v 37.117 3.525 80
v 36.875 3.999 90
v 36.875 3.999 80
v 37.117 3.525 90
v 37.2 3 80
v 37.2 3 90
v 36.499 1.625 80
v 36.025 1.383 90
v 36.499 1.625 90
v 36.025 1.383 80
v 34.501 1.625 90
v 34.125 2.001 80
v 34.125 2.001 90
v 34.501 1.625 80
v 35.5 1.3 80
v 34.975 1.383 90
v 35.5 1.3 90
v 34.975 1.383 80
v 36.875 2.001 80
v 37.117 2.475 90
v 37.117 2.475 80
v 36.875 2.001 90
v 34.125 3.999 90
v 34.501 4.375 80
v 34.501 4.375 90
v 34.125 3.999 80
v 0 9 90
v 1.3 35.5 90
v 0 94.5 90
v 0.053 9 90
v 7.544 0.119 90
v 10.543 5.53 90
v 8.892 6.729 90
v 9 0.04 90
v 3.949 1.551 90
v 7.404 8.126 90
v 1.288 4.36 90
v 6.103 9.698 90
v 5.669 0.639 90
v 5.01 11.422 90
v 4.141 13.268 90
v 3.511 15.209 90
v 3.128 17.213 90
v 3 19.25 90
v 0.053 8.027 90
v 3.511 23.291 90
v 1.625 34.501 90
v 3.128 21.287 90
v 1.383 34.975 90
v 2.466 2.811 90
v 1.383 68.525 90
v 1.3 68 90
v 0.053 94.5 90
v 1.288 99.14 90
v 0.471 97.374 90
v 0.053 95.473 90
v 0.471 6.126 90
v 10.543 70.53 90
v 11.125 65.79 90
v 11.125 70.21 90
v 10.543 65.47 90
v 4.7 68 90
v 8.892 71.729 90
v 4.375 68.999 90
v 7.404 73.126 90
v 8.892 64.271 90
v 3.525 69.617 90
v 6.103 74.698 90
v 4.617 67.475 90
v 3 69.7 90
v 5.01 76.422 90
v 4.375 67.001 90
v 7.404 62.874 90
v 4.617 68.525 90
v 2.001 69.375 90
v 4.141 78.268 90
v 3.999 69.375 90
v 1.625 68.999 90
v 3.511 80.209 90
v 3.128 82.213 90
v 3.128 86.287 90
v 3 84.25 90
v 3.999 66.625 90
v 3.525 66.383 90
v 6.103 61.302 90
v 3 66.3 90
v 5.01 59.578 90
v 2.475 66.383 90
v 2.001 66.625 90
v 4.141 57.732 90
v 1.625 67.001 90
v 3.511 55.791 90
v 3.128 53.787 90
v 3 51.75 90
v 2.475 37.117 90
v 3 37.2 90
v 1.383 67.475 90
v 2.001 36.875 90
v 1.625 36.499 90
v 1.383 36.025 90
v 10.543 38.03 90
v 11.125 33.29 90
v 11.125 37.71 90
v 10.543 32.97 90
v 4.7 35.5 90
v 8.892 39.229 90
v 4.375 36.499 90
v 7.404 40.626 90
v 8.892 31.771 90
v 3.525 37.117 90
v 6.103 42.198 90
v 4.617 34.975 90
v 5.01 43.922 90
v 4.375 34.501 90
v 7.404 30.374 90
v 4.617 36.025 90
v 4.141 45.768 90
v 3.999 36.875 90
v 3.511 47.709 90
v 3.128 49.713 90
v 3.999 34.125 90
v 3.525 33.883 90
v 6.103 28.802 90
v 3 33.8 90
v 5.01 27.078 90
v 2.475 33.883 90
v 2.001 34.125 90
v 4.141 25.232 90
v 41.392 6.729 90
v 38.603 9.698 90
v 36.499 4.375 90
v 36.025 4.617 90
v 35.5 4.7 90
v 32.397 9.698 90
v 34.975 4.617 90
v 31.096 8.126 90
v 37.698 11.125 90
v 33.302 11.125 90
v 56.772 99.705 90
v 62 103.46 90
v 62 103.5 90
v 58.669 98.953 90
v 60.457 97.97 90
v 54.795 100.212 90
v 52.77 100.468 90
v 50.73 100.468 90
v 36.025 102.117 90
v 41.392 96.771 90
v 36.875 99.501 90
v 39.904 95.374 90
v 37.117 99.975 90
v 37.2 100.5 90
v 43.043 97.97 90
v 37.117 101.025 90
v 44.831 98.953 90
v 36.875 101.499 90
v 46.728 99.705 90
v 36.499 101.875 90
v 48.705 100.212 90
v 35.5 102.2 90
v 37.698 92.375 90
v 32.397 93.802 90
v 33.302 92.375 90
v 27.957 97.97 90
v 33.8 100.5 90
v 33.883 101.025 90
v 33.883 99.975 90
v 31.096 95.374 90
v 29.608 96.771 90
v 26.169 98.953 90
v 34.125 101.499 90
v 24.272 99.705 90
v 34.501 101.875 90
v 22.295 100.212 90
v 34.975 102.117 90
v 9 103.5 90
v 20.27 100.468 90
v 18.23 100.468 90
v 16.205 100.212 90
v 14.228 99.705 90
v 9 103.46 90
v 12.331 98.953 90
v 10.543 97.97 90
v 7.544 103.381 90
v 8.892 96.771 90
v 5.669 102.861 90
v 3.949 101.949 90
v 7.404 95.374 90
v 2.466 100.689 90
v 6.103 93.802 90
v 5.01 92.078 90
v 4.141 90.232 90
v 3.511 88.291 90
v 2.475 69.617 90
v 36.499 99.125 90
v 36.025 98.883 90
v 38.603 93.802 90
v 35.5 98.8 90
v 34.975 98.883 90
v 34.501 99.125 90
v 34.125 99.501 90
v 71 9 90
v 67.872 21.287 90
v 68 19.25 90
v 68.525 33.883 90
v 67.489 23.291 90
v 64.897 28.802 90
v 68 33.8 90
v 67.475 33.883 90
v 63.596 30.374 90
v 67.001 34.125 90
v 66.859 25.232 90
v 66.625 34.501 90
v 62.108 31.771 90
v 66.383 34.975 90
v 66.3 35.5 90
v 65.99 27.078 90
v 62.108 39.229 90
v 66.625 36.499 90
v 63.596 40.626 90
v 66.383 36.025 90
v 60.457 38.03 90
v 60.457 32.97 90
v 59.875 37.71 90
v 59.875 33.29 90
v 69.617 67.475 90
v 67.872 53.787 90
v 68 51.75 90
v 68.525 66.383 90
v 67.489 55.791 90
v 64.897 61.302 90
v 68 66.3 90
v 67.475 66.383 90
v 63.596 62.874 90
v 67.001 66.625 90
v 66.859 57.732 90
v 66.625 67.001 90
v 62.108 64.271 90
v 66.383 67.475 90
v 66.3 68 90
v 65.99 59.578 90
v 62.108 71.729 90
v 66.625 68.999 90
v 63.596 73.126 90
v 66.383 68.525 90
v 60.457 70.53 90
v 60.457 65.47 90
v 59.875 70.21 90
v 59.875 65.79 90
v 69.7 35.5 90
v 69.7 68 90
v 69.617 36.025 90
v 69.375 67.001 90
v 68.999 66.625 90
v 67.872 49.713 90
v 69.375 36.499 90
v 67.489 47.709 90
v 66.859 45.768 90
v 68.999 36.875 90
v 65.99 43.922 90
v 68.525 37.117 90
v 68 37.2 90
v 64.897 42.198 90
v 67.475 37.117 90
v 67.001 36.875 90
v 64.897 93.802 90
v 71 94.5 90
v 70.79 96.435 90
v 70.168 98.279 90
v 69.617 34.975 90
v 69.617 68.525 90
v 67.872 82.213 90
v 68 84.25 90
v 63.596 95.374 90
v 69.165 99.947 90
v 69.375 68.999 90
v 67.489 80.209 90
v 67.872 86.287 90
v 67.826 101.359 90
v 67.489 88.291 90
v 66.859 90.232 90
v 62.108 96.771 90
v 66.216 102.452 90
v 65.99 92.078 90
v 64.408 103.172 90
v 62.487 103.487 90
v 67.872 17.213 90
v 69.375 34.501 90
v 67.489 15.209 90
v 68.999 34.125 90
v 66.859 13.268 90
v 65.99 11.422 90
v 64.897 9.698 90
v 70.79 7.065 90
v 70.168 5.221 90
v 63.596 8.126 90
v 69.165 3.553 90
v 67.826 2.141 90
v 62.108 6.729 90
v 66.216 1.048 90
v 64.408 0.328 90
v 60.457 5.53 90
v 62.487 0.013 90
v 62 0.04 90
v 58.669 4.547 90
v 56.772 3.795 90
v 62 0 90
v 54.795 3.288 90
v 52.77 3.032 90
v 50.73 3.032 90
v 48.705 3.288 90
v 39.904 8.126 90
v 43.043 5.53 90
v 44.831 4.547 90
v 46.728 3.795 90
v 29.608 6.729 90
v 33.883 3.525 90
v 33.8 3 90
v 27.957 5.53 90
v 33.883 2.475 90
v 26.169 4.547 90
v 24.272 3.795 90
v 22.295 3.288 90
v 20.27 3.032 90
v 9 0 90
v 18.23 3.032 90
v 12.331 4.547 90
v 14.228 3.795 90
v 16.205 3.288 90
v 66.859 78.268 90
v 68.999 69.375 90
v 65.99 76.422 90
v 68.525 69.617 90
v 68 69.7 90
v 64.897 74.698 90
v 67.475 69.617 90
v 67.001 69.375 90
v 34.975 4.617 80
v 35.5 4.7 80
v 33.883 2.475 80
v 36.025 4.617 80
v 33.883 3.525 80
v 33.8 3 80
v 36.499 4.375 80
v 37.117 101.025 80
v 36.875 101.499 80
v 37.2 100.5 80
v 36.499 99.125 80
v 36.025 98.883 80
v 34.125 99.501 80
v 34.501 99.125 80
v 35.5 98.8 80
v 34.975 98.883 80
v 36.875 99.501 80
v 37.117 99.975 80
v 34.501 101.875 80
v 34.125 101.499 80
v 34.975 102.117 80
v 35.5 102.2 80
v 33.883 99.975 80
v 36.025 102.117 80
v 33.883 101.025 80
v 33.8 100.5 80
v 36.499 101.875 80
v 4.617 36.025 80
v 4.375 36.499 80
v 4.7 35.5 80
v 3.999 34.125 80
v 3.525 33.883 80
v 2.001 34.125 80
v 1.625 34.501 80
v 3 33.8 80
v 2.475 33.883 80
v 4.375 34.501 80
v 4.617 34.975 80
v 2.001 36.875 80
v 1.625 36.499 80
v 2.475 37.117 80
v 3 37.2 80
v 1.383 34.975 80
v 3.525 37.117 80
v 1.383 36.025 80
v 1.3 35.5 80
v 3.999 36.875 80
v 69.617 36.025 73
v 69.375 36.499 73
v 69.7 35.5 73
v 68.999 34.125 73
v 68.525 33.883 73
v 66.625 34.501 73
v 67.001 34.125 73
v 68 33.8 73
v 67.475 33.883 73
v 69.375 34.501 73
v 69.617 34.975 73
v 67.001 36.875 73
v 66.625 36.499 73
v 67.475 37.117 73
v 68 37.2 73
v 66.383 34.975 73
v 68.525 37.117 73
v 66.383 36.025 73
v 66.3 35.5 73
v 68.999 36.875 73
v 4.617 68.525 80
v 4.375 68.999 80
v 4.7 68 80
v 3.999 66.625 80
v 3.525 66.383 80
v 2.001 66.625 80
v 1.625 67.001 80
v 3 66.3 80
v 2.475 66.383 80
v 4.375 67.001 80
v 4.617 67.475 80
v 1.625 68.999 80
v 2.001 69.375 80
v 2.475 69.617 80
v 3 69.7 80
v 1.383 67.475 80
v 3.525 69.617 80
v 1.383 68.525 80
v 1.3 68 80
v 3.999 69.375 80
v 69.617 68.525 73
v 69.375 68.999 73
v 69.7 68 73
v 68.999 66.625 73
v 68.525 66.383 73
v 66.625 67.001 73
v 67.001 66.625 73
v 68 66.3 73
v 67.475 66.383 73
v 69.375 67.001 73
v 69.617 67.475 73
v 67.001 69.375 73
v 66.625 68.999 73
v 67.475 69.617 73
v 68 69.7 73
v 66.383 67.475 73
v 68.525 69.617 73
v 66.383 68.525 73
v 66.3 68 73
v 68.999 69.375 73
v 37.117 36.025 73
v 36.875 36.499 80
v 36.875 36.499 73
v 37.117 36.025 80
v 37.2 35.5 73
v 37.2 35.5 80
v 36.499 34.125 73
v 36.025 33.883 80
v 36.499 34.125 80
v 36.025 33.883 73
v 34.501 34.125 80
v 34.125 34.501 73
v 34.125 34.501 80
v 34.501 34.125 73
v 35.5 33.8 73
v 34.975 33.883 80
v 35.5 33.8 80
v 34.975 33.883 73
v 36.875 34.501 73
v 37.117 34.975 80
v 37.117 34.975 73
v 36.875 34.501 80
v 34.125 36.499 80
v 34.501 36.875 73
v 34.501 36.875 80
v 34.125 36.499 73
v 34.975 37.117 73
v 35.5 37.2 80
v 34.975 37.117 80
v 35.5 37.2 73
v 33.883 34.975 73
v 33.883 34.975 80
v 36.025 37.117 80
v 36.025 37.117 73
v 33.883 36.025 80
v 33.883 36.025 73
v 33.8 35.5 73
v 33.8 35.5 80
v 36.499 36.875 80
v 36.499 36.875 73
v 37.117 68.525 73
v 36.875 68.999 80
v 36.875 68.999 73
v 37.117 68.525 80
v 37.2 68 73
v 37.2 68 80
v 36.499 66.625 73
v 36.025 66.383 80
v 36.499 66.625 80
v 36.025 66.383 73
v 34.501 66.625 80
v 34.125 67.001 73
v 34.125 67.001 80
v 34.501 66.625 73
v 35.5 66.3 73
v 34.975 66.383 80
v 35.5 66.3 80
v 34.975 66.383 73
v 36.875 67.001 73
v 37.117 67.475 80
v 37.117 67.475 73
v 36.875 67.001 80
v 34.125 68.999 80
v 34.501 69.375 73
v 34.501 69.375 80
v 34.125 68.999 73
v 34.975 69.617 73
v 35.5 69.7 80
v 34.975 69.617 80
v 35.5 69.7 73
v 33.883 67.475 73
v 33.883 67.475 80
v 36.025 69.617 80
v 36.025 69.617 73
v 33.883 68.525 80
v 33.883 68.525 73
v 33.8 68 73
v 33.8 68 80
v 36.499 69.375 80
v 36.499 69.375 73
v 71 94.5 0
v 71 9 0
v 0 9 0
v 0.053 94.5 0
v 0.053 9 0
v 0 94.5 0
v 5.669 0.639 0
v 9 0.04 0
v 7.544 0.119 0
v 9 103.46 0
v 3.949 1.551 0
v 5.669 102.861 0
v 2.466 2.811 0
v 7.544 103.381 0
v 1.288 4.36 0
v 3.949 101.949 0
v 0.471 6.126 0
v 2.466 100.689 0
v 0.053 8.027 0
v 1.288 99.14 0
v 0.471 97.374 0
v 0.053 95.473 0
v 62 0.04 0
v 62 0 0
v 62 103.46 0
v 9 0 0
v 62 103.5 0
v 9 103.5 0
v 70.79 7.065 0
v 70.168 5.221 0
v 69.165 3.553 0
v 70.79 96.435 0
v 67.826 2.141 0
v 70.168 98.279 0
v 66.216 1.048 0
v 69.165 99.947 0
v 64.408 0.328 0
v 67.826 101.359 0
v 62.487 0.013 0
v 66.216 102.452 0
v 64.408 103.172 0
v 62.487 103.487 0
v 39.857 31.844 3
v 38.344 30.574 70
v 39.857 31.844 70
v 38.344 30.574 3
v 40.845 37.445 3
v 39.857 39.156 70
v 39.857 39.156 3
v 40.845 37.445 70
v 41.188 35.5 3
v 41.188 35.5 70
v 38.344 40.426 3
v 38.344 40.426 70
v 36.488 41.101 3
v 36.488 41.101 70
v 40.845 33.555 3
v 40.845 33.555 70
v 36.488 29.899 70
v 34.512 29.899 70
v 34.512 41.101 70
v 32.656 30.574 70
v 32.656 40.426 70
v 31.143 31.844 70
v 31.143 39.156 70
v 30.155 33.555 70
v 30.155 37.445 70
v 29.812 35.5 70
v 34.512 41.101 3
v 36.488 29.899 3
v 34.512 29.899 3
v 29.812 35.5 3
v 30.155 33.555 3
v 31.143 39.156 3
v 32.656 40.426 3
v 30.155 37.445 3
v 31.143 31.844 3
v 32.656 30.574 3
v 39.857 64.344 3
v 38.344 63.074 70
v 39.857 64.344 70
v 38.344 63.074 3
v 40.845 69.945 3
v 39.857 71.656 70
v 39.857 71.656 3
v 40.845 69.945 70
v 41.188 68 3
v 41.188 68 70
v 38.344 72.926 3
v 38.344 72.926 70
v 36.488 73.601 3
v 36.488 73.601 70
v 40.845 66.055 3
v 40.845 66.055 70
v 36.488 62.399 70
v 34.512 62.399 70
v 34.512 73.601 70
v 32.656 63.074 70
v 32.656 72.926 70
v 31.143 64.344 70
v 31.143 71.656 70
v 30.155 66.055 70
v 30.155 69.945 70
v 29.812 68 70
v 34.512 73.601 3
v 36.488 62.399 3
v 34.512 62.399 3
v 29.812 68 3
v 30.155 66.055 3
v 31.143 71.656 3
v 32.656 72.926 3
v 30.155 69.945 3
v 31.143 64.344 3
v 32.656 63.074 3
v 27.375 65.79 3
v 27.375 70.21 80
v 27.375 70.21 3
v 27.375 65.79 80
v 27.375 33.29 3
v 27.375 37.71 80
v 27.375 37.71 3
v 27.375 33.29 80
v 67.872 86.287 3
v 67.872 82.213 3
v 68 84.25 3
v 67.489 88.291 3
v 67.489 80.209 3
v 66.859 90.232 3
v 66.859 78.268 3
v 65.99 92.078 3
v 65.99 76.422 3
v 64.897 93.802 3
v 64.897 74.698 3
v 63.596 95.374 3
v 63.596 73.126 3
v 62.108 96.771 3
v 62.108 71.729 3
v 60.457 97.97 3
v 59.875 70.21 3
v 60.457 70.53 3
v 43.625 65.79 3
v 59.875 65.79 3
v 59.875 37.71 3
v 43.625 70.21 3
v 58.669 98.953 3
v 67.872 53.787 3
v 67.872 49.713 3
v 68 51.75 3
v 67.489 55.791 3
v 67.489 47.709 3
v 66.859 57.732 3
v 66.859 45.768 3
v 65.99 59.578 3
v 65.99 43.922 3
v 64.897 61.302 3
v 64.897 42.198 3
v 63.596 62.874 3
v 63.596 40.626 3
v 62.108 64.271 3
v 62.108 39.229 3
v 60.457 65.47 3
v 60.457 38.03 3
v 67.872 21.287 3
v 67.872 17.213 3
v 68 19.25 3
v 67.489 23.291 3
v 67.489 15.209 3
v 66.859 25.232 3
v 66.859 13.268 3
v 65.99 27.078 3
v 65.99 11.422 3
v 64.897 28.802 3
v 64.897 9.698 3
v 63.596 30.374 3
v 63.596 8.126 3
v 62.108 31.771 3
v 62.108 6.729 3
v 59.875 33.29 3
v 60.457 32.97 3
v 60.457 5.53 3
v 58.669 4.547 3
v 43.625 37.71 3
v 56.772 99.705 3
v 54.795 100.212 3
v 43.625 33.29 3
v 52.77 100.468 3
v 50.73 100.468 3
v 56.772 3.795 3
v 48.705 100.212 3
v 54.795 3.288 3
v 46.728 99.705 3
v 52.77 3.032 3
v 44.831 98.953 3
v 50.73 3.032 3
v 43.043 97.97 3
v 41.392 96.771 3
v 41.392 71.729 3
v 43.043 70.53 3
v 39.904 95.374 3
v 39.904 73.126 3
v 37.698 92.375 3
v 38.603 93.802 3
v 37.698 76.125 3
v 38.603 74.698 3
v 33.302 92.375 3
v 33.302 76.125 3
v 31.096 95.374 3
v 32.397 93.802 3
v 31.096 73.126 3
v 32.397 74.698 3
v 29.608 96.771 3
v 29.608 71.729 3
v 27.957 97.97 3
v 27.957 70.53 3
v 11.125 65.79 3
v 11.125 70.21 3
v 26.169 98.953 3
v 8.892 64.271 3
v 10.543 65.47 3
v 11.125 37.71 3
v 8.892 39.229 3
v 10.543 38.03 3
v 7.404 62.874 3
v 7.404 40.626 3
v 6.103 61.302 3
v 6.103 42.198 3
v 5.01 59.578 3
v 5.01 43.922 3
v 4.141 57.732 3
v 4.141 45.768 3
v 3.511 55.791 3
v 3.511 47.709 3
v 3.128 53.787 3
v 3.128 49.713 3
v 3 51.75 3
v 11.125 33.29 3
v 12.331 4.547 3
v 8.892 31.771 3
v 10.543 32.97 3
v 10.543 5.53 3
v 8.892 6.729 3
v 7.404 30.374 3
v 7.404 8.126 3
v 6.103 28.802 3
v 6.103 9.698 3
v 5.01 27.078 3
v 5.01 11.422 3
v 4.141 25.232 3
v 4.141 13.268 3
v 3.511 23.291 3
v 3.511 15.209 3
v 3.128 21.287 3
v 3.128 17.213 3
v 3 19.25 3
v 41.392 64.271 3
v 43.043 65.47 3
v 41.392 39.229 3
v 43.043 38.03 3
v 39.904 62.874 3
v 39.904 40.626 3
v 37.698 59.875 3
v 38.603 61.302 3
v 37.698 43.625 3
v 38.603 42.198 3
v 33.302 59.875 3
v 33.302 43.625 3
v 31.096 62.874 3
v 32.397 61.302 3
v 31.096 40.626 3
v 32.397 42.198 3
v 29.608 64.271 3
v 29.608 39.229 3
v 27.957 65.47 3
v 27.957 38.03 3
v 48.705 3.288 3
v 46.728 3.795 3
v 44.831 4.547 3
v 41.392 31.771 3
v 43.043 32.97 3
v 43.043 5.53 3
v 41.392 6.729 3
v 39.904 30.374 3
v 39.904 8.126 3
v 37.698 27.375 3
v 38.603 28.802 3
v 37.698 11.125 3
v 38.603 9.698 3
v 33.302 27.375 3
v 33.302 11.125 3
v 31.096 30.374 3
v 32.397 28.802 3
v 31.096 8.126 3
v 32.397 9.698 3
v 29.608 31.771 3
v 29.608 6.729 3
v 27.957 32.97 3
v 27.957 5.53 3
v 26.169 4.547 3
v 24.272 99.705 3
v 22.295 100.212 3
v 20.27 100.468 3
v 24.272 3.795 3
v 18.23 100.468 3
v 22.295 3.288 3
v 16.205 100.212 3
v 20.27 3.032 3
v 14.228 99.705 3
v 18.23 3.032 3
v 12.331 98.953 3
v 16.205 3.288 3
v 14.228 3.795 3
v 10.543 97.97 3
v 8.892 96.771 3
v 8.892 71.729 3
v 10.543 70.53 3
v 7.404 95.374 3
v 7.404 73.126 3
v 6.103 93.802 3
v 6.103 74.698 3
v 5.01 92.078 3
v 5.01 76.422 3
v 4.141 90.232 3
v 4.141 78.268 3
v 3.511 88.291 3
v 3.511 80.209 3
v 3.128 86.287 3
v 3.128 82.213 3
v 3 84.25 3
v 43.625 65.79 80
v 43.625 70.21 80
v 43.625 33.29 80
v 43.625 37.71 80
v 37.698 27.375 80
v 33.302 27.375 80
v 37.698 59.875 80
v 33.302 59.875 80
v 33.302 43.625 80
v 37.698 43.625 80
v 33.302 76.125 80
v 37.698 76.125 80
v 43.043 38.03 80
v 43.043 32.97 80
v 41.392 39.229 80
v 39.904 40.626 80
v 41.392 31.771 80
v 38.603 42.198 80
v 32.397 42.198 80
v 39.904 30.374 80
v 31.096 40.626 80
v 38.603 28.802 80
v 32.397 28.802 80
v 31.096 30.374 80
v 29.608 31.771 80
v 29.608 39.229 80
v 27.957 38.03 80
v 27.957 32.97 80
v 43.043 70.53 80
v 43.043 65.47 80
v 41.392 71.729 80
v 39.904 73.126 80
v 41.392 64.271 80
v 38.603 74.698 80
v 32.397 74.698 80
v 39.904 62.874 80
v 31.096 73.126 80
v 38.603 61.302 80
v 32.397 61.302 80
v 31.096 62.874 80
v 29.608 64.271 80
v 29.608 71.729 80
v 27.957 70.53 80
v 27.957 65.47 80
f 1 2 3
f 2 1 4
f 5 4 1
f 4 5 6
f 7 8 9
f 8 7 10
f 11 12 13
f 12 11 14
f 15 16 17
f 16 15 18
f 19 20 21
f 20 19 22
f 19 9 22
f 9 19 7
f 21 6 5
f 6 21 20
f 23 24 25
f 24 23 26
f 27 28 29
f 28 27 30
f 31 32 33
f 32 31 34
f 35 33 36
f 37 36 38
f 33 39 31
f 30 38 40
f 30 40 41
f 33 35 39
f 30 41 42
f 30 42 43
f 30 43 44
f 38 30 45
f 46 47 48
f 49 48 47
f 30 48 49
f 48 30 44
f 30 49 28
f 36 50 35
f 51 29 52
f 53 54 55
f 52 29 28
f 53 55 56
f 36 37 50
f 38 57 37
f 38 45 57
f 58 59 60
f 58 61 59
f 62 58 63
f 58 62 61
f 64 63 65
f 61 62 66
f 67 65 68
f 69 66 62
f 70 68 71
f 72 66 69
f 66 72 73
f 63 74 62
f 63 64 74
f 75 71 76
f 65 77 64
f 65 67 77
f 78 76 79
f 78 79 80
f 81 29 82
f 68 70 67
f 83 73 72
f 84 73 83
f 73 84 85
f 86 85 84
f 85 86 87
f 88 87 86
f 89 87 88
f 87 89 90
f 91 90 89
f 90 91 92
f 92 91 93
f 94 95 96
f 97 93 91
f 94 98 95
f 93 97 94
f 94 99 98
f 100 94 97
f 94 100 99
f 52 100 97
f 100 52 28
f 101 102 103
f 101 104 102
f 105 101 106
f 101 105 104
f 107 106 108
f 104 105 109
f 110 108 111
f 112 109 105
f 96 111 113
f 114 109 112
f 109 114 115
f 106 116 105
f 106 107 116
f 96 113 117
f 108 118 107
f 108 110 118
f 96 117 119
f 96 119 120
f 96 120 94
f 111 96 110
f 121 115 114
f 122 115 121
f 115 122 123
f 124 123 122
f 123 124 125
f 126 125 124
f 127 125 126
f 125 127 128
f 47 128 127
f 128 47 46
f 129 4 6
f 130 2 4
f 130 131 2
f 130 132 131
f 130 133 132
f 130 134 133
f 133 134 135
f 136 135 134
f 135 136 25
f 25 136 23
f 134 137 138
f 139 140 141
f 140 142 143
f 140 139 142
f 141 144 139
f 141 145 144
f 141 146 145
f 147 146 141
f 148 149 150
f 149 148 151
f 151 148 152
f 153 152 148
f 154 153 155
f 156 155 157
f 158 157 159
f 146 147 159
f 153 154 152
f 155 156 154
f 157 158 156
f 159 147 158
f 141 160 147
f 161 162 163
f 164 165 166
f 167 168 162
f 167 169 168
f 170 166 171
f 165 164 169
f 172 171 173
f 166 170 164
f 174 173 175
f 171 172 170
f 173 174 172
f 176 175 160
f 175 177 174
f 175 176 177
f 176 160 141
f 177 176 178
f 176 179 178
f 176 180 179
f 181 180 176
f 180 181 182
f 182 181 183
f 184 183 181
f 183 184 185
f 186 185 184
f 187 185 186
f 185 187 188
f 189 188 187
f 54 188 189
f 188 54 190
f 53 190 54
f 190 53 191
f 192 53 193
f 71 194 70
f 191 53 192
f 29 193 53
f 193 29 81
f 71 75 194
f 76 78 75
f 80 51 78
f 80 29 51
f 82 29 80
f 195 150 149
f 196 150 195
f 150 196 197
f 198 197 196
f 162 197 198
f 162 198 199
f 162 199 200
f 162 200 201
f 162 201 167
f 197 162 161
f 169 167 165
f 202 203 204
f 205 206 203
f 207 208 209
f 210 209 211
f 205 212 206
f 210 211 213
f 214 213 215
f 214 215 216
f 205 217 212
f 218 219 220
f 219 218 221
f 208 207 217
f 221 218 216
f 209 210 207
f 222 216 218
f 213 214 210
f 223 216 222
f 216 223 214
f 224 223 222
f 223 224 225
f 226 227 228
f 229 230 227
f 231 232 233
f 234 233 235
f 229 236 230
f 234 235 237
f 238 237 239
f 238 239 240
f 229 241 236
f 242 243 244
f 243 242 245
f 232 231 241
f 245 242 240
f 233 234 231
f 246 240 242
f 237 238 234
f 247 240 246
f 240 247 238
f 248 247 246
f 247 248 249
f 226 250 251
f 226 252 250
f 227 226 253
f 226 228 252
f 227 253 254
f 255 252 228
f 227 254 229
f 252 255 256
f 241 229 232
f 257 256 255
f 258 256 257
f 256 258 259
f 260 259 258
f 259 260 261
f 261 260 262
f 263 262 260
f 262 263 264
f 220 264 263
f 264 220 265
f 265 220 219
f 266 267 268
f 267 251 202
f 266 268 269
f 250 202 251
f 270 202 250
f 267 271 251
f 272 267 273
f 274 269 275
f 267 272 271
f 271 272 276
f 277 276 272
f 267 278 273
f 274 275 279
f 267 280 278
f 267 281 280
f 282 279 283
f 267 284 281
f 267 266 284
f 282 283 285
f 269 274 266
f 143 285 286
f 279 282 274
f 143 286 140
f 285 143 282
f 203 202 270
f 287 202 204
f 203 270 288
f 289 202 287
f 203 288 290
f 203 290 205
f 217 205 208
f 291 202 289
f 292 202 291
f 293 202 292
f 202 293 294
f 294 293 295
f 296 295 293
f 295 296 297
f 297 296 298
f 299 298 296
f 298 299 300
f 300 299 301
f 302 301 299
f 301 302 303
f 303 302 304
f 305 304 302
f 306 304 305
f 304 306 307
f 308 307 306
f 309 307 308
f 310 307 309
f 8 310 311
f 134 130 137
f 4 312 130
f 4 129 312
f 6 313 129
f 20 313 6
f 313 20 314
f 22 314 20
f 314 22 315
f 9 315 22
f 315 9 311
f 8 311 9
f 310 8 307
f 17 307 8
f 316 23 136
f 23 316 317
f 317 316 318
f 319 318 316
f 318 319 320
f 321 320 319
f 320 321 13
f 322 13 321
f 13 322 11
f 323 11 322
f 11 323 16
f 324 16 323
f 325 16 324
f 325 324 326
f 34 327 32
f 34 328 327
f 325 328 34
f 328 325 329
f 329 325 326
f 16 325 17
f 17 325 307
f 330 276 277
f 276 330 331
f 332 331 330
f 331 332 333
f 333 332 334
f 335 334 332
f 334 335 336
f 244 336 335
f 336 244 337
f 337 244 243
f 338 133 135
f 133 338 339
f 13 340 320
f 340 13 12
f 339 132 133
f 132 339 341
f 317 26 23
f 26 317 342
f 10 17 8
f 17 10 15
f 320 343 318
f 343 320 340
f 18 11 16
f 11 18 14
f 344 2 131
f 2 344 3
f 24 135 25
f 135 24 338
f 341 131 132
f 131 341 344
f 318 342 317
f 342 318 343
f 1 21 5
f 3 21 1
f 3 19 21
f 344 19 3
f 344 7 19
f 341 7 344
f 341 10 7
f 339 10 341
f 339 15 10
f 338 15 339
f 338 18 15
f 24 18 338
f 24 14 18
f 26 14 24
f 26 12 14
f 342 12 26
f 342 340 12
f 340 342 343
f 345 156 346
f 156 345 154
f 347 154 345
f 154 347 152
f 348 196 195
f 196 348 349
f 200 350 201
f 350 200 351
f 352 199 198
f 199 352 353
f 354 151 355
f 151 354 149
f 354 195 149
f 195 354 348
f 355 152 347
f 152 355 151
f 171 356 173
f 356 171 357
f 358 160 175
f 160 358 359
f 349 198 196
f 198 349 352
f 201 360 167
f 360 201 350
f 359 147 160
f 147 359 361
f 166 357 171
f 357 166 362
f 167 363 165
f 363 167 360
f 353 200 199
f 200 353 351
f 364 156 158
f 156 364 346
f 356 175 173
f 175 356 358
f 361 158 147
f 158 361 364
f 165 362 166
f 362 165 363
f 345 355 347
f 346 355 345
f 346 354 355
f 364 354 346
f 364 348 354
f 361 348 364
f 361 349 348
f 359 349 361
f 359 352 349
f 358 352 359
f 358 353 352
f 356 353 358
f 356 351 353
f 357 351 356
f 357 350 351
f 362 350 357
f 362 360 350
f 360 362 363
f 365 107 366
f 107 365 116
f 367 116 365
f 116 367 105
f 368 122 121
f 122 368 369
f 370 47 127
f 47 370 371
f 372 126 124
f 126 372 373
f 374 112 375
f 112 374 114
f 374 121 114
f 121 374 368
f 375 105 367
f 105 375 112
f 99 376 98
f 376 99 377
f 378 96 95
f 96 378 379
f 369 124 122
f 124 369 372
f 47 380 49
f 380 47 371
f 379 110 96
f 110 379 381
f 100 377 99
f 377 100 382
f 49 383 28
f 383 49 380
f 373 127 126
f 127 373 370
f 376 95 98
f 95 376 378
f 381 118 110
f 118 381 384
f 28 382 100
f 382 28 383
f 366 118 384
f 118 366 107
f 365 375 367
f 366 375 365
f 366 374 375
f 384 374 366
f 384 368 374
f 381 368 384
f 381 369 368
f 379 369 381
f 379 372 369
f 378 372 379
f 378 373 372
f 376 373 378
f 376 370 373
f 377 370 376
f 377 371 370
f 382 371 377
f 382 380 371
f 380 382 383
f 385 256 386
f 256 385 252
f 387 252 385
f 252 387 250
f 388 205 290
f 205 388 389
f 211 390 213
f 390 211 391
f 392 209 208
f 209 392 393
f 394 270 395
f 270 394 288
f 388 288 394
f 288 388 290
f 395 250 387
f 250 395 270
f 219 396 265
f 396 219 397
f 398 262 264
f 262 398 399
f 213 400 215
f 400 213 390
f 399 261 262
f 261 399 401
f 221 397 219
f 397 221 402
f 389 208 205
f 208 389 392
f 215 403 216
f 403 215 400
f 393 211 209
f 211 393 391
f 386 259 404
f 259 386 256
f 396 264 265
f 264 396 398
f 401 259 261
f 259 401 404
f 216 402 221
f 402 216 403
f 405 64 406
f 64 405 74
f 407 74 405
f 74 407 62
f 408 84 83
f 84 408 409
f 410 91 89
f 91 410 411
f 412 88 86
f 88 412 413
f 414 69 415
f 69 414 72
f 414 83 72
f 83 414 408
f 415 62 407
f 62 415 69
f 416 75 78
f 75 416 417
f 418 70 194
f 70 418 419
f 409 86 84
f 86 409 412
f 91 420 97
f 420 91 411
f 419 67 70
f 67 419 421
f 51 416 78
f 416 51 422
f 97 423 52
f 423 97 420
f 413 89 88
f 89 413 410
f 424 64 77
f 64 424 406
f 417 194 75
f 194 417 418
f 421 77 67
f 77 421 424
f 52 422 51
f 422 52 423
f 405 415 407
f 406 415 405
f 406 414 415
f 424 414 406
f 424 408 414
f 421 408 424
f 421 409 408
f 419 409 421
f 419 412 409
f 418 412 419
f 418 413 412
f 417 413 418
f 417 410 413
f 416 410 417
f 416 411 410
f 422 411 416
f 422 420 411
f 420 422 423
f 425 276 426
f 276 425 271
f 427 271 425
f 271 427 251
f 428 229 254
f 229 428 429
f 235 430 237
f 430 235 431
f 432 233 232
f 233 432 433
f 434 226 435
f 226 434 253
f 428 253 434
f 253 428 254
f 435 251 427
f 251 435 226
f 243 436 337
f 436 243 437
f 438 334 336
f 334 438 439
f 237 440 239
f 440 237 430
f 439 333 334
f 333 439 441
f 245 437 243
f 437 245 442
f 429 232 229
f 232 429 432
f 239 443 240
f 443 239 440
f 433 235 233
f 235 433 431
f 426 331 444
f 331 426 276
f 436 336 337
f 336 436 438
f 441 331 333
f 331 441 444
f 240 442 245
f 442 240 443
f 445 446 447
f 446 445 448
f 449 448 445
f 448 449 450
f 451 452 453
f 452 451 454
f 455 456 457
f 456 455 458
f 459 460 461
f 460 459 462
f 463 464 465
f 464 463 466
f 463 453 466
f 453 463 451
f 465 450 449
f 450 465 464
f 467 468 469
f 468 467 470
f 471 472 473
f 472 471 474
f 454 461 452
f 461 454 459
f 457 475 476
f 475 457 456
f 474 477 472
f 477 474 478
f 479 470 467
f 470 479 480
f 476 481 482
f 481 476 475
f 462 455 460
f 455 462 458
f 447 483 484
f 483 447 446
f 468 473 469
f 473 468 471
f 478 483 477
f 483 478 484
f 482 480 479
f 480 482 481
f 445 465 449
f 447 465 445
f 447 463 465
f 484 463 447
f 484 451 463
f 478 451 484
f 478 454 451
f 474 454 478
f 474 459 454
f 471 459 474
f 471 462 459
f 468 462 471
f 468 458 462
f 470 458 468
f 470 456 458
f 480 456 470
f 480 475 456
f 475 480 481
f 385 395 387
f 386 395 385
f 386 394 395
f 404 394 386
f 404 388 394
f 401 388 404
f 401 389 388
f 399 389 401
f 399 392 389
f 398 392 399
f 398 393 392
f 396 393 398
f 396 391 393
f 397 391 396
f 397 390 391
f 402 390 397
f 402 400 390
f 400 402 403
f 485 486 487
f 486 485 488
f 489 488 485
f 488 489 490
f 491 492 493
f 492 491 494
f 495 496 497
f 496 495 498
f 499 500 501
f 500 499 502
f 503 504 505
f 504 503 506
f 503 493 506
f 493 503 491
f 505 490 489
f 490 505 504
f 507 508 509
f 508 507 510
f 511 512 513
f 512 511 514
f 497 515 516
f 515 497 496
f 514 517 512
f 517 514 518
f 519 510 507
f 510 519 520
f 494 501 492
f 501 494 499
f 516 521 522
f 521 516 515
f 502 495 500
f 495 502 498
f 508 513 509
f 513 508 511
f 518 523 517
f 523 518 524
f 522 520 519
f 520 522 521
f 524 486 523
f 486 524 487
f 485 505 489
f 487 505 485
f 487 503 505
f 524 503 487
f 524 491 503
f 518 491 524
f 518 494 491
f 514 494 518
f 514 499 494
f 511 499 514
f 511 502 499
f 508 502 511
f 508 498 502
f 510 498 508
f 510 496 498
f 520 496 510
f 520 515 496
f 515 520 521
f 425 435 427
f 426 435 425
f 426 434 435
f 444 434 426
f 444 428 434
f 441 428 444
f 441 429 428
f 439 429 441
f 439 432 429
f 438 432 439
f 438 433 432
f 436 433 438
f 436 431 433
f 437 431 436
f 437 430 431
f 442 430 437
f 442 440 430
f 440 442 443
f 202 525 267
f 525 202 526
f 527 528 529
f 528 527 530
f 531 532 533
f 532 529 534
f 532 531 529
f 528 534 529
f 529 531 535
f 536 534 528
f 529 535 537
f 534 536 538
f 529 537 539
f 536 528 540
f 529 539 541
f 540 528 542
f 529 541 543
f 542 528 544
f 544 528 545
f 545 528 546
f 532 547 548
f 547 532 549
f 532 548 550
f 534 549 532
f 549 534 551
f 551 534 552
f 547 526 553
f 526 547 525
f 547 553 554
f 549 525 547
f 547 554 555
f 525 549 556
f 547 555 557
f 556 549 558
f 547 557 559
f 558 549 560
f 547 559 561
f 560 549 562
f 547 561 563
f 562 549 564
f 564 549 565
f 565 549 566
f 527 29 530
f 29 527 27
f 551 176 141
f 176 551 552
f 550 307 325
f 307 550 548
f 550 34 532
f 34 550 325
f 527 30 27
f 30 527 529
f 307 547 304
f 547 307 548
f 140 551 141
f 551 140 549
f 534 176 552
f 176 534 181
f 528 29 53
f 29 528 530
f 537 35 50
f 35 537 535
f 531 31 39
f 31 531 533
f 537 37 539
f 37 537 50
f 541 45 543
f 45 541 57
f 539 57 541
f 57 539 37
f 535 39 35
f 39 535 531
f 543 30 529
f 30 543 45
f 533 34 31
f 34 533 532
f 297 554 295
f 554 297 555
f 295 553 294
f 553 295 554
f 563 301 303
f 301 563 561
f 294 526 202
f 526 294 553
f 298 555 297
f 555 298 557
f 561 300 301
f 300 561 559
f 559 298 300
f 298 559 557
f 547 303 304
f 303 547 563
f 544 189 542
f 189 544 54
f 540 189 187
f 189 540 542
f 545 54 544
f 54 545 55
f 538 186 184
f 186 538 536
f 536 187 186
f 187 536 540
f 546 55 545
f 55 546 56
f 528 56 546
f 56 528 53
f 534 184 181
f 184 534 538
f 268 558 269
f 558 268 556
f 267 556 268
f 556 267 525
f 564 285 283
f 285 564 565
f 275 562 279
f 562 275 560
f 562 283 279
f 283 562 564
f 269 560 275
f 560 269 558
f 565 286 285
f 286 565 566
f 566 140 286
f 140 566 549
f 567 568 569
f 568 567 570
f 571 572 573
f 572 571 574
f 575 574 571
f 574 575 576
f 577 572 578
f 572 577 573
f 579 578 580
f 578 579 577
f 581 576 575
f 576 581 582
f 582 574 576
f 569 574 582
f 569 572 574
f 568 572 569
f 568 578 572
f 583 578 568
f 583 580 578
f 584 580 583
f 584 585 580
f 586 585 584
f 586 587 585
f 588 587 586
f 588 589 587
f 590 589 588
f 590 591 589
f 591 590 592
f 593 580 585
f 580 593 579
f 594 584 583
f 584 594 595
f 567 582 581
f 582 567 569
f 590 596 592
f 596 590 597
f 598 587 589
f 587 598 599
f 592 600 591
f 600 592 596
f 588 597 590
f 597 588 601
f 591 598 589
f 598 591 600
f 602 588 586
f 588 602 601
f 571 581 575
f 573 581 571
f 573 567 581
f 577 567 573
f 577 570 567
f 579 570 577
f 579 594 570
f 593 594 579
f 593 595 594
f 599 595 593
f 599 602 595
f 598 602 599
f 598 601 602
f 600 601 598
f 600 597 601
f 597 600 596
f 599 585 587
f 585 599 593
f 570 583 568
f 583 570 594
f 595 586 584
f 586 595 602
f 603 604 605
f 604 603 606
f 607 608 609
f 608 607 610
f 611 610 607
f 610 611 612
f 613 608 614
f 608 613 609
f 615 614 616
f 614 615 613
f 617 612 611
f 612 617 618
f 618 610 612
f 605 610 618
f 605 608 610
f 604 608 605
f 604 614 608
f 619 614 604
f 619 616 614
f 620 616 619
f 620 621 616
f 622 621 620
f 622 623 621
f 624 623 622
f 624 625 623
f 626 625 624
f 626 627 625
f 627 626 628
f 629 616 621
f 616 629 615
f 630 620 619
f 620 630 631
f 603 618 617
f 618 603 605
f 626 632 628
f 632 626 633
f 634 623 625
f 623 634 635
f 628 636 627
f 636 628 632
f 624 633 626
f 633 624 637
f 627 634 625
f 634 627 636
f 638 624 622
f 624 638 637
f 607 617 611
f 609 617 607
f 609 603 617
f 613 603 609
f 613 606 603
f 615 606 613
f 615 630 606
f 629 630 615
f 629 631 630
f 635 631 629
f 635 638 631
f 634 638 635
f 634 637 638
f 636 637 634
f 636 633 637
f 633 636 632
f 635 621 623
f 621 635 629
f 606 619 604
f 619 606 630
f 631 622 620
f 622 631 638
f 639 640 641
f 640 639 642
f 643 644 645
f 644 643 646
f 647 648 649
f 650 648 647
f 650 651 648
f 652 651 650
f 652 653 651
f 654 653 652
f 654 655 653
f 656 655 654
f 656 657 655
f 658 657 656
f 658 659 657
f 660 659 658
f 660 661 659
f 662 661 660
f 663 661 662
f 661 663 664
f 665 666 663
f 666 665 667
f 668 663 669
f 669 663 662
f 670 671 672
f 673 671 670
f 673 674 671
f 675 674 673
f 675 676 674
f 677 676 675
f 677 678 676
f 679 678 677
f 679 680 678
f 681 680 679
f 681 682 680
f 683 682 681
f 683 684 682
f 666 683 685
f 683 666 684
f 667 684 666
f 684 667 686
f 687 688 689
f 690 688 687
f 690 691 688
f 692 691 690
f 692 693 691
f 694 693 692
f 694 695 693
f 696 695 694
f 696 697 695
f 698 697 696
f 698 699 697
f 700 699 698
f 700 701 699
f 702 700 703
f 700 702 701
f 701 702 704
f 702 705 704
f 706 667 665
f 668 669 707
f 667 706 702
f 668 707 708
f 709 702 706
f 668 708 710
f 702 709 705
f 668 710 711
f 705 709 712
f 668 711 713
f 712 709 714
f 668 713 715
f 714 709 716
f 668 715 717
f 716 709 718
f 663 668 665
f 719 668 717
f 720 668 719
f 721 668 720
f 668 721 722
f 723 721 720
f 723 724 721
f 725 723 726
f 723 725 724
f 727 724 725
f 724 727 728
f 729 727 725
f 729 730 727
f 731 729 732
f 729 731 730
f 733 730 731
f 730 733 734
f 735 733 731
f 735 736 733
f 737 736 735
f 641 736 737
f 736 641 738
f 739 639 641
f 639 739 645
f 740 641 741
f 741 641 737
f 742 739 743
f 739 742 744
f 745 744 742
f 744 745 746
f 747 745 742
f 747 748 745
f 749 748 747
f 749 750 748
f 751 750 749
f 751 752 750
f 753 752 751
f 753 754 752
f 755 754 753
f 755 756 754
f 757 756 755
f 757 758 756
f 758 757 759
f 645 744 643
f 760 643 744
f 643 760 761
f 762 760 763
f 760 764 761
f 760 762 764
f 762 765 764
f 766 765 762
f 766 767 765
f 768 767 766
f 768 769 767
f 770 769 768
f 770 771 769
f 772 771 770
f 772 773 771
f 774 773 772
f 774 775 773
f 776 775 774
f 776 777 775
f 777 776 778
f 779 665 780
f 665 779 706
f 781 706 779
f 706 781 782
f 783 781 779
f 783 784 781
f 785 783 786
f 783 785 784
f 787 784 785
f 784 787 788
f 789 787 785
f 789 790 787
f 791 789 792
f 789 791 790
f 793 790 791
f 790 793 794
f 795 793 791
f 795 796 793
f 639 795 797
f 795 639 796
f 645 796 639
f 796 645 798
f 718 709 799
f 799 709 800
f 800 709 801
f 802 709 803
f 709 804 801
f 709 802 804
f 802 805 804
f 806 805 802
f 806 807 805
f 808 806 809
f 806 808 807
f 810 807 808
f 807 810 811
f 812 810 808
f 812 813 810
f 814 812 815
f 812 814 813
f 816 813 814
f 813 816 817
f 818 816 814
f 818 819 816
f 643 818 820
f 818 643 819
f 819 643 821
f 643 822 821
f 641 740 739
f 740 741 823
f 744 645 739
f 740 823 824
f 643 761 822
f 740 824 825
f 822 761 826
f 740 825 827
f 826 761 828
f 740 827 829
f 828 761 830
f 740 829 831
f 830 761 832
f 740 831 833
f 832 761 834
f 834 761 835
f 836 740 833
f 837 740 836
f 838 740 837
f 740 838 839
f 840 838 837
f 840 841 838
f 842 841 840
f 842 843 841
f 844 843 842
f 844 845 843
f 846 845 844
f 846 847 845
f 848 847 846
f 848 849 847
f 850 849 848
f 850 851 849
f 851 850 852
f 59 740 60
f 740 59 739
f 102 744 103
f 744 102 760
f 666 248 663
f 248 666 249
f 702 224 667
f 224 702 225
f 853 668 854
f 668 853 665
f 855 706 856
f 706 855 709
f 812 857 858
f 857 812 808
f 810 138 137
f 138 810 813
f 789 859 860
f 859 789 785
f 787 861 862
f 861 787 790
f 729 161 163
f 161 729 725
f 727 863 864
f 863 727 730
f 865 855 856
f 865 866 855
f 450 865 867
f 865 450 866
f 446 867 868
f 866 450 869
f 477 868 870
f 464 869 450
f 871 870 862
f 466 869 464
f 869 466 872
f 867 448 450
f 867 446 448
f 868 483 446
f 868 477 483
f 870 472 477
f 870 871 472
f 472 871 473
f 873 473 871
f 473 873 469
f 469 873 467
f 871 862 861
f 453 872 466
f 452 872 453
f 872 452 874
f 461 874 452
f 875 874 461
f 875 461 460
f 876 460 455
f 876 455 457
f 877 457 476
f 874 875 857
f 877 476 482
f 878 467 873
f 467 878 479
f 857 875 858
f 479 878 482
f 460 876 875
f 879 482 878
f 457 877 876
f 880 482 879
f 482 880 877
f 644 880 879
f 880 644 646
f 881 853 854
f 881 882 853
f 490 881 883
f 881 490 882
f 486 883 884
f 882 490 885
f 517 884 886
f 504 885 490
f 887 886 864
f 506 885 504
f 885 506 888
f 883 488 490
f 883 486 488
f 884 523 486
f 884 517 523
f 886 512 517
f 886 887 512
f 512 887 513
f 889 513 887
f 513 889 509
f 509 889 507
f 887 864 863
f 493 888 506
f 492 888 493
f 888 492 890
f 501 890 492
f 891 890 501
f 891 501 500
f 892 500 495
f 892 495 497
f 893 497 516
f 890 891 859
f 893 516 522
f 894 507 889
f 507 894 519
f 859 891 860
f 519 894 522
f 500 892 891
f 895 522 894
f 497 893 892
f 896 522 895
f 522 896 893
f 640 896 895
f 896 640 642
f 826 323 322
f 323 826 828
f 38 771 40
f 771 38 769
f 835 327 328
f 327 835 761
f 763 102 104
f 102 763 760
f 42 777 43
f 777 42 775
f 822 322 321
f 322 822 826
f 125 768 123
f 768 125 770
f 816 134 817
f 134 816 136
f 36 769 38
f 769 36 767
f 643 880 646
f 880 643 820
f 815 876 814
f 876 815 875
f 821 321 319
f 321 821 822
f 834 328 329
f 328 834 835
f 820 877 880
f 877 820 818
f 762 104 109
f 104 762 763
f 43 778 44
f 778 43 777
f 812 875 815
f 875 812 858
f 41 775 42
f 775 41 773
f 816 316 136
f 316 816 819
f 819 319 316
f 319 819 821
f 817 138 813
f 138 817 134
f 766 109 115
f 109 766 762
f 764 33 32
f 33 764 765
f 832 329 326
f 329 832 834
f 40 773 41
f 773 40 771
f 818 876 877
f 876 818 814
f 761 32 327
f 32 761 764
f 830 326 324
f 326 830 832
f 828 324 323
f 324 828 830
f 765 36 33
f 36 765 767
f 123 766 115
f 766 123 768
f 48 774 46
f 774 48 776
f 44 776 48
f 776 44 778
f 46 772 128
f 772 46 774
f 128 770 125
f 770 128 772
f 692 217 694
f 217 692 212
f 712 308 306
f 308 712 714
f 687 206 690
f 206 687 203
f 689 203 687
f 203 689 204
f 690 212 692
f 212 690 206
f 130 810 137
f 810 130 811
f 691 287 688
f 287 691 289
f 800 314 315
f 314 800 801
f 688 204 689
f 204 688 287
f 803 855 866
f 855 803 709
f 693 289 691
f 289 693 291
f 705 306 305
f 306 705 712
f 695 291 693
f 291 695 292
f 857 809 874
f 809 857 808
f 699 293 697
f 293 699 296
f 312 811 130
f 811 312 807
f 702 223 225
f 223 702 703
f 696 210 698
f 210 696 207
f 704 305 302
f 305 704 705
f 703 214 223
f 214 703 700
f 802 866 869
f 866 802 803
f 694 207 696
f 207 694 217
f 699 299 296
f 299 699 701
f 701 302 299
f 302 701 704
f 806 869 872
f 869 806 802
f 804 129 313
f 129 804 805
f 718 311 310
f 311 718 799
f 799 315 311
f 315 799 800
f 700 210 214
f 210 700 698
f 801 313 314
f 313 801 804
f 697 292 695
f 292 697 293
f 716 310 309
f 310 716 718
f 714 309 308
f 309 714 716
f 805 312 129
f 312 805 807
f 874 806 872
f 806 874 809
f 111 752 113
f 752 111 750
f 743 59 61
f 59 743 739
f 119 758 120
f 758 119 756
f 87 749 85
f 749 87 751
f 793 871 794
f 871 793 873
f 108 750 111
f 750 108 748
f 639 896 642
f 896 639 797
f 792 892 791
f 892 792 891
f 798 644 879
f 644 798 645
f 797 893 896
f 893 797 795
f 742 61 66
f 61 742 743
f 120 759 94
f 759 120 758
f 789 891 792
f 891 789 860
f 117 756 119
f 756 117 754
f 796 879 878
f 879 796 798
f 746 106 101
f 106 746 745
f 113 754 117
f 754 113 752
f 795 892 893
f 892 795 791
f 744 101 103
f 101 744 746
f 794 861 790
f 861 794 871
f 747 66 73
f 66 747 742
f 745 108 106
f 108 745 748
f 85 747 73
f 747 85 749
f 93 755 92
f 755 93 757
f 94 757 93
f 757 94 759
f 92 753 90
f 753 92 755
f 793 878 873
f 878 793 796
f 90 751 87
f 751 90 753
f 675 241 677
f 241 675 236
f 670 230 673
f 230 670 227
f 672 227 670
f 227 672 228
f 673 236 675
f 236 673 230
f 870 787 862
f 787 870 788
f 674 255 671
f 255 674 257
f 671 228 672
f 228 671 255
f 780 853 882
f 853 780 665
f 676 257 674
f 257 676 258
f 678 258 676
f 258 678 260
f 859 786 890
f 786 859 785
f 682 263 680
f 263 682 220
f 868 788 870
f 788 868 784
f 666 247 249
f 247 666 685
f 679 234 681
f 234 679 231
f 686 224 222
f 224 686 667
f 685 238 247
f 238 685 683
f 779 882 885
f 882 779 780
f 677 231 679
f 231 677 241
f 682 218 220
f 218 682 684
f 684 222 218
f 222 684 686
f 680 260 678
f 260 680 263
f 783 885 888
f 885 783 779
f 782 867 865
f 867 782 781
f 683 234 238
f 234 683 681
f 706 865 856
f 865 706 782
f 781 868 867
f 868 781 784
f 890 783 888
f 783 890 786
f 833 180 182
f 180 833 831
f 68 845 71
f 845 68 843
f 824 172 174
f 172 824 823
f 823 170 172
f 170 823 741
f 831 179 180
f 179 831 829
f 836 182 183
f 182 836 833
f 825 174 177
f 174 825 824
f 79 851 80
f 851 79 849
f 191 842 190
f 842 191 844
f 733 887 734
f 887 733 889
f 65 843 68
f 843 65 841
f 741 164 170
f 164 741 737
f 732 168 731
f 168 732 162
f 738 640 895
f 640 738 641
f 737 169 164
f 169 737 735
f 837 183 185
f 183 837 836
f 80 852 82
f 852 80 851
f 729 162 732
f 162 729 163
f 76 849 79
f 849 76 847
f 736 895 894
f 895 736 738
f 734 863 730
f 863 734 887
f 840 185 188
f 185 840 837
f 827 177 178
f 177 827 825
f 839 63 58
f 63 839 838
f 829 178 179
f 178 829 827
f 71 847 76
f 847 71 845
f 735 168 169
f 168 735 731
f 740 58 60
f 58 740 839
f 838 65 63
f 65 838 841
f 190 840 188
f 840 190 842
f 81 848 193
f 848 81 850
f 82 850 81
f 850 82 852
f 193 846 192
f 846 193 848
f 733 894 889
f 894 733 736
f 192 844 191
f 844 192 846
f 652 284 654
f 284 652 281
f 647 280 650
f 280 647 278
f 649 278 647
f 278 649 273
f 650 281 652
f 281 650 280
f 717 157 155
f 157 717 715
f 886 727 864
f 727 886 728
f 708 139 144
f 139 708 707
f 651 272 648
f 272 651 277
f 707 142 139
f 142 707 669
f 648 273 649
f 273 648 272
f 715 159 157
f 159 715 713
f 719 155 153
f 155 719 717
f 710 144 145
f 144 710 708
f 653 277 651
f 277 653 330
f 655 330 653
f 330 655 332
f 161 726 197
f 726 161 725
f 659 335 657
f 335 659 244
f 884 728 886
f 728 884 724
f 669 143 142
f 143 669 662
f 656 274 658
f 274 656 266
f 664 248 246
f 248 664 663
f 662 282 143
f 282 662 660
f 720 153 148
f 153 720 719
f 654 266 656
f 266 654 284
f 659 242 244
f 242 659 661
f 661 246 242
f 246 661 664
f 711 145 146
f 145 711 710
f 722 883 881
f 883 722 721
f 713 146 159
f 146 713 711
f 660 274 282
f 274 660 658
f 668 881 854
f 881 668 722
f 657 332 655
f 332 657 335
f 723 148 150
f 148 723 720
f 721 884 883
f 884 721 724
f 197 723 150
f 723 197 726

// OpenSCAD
cellSize = 32.5;
cellHeight = 80;
numberCellLength = 2; // this is along the x dim
numberCellWidth = 3; // this is along the y dim
height = 90; // total enclosure height excluding the lid
buffer = 3; // the wall thickness
xBankLength = 2*buffer + numberCellLength*cellSize;
yBankLength = 2*buffer + numberCellWidth*cellSize;
screwSize = 3.4;
screwLength = 10;

module constructBase(){
  // draw the shape out, cut the corners, cut screw holes
  difference(){
      cube([xBankLength, yBankLength, height]);
      cube([3*buffer, 3*buffer, height]);
      translate([xBankLength - 3*buffer, 0, 0])
        cube([3*buffer, 3*buffer, height]);
      translate([xBankLength - 3*buffer, yBankLength - 3*buffer, 0])
        cube([3*buffer, 3*buffer, height]);
      translate([0, yBankLength - 3*buffer, 0])
        cube([3*buffer,3*buffer,height]);
      screwTapping(); // screws are cut before the corners are filled back in
    }

    // replace the cut corners with rounded corners
    translate([3*buffer, 3*buffer, 0])
      cylinder(r = 3*buffer, height);
    translate([xBankLength - 3*buffer, 3*buffer, 0])
      cylinder(r=3*buffer, height);
    translate([3*buffer, yBankLength-3*buffer, 0])
      cylinder(r=3*buffer, height);
    translate([xBankLength - 3*buffer, yBankLength - 3*buffer, 0])
      cylinder(r=3*buffer, height);
}

module cellConstructor(){
  for(x = [0:numberCellWidth - 1]){
    for(y = [0:numberCellLength - 1]){
      translate([buffer + (cellSize/2) + (cellSize*y), buffer + (cellSize/2) + (cellSize*x), buffer])
        cylinder(h = height-buffer, d = cellSize, $fn = 50);
    }
  }
}

module supportSkeletize(){
  // this cuts away extra areas inside the center posts
  for(x = [1:numberCellWidth-1]){
    for(y = [1:numberCellLength-1]){
      translate([buffer + cellSize + (cellSize*(y-1)), buffer + cellSize + (cellSize*(x-1)), buffer])
      cylinder(h = cellHeight - buffer - screwLength, d = (cellSize/2)*0.70);
    }
  }

  // these two cut away the thin round walls between the cells
  for(x = [0:numberCellLength-1]){
    translate([buffer + cellSize/4 + cellSize*x, buffer + cellSize/2, buffer])
    cube([cellSize/2, yBankLength - 2*buffer - cellSize, height - buffer]);
  }

  for(y = [0:numberCellWidth-1]){
    translate([buffer + cellSize/2, buffer + cellSize/4 + cellSize*y, buffer])
    cube([xBankLength - 2*buffer - cellSize, cellSize/2, height - buffer]);
  }

  // this lowers the center posts down for mounting things
  translate([buffer + cellSize/2, buffer + cellSize/2, cellHeight])
  cube([xBankLength - 2*buffer - cellSize, yBankLength - 2*buffer - cellSize, height - cellHeight]);
}

module screwTapping(){
  // these add the exterior screws
  for(x=[0:numberCellLength-1]){
    translate([buffer+cellSize+(cellSize*x),buffer,height-screwLength])
    cylinder(h = screwLength, d = screwSize, $fn = 20);
    translate([buffer+cellSize+(cellSize*x),yBankLength-buffer,height-screwLength])
    cylinder(h = screwLength, d = screwSize, $fn = 20);
  }

  for(y=[0:numberCellWidth-1]){
    translate([buffer,buffer+cellSize+(cellSize*y),height-screwLength])
    cylinder(h = screwLength, d = screwSize, $fn = 20);
    translate([xBankLength-buffer,buffer+cellSize+(cellSize*y),height-screwLength])
    cylinder(h = screwLength, d = screwSize, $fn = 20);
  }

  // this adds interior screw holes in the posts
  for(x = [1:numberCellLength]){
    for(y = [1:numberCellWidth]){
      translate([buffer + cellSize + (cellSize*(y-1)), buffer + cellSize + (cellSize*(x-1)), buffer + cellHeight - screwLength])
      cylinder(h = screwLength, d = screwSize, $fn = 20);
    }
  }
}

// Final Assembly!

difference(){
  constructBase();
  supportSkeletize();
  cellConstructor();
}
